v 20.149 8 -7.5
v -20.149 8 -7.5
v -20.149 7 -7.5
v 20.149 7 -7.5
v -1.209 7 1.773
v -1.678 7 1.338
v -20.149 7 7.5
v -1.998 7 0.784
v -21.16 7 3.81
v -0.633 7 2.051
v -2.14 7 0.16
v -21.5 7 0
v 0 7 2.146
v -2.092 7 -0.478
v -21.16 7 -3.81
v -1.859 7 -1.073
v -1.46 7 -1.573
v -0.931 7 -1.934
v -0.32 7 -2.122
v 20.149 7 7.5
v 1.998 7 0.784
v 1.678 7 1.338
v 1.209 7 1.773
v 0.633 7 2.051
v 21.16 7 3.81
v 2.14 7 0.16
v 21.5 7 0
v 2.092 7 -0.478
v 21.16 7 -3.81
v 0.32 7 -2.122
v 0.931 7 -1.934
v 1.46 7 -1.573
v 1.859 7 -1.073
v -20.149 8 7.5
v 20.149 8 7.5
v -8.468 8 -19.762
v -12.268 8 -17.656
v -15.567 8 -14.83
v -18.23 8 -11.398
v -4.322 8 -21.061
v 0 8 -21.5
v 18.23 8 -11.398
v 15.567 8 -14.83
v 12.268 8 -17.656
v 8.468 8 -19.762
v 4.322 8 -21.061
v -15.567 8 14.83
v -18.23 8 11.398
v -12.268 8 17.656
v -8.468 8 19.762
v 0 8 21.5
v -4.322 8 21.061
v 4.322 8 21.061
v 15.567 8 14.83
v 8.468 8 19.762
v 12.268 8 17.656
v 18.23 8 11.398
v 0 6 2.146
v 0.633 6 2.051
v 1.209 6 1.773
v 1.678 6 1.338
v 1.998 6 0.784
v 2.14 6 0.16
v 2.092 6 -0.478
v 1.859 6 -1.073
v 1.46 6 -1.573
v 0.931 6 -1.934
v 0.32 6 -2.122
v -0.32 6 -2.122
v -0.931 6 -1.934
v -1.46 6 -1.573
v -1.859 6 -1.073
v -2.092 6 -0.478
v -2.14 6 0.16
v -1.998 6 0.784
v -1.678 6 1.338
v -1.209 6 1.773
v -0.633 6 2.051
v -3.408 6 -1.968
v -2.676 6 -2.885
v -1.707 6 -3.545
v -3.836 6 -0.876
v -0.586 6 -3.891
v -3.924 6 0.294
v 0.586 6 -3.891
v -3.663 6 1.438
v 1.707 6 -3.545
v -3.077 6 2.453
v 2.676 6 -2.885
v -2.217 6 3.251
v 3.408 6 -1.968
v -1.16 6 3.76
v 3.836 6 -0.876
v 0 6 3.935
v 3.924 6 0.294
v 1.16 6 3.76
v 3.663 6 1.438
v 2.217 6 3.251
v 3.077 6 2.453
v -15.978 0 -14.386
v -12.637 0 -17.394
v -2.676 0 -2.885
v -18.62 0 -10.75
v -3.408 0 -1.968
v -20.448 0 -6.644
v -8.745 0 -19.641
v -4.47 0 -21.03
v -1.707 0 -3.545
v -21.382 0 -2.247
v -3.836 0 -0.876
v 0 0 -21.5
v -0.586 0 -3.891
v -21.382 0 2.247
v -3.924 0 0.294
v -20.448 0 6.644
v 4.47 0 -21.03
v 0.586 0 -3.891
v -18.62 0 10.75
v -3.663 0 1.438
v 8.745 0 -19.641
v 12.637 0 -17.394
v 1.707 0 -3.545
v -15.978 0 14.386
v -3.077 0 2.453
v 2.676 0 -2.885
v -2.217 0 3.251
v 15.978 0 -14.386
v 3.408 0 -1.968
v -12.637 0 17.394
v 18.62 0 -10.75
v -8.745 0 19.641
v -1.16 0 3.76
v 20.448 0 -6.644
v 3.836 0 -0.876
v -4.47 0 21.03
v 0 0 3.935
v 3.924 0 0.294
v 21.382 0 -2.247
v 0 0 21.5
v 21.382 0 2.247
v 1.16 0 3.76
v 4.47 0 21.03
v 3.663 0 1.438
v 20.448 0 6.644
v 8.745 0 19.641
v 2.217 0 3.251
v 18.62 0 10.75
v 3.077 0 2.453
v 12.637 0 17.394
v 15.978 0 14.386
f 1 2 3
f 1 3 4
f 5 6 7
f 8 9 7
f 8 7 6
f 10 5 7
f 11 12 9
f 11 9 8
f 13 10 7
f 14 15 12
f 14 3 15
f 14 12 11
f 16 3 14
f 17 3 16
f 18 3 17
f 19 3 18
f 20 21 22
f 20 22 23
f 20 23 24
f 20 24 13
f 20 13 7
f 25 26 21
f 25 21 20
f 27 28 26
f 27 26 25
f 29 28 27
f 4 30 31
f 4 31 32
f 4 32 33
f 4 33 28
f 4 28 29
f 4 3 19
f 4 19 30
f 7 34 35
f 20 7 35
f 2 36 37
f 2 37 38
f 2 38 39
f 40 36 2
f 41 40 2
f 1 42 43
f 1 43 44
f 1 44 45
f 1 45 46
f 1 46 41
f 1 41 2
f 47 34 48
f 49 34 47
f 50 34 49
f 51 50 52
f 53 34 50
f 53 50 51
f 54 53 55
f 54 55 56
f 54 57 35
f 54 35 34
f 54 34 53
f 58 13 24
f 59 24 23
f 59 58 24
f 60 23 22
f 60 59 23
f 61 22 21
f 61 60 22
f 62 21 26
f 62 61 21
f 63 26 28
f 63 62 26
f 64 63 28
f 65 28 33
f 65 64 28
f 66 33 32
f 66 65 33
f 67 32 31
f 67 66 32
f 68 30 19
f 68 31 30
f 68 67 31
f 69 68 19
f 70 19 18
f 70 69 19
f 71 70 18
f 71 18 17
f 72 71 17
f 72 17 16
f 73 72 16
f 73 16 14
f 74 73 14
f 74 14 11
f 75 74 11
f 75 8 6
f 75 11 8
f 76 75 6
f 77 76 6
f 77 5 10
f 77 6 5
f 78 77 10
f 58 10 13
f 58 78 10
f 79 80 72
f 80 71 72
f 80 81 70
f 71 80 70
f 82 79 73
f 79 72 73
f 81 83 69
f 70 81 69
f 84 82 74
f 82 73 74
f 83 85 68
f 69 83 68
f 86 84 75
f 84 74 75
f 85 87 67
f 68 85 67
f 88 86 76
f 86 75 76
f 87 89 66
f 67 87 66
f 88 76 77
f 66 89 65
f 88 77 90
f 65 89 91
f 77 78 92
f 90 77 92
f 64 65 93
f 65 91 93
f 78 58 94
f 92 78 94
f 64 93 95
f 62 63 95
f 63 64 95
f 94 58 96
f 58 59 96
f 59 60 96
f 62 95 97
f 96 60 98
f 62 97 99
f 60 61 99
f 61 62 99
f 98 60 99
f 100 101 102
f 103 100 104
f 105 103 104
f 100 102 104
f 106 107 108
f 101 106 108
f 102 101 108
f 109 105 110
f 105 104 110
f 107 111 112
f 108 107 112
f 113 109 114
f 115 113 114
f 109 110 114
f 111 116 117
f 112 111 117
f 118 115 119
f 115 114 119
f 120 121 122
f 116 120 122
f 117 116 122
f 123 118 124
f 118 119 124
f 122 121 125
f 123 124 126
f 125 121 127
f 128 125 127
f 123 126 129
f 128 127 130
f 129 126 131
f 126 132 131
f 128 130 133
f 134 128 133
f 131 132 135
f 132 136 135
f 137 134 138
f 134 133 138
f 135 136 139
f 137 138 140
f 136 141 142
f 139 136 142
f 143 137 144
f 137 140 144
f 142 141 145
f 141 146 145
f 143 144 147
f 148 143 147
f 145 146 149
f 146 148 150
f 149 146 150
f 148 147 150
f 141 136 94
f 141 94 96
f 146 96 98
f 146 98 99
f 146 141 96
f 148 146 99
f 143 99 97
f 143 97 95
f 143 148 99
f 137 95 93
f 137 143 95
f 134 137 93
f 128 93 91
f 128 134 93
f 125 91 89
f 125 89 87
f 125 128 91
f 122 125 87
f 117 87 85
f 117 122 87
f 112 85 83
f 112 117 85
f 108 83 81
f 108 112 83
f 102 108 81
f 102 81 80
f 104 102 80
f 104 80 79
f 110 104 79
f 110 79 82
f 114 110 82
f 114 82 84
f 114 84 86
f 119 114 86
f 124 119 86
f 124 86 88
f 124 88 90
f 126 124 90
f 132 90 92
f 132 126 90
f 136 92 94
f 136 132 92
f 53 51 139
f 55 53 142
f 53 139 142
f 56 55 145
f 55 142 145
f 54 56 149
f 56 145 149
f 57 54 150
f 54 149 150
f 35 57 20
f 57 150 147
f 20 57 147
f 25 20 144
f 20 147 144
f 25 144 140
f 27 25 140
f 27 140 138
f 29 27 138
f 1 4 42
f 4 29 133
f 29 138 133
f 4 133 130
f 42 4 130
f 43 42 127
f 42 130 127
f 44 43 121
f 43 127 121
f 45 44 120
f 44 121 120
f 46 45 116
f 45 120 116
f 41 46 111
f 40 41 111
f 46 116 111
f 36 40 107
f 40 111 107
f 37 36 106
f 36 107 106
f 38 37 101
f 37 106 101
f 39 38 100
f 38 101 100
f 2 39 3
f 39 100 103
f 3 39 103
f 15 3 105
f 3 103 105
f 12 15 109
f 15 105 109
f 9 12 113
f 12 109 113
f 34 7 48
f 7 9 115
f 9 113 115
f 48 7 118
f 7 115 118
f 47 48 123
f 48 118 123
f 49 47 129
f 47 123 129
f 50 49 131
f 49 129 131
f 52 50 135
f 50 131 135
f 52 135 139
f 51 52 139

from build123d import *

# Parameters (mm, degrees)
SKETCH1_R           = 21.5
SKETCH1_R_2         = 3.935
BOSS_EXTRUDE1_DEPTH = 6
SKETCH2_R           = 21.5
SKETCH2_R_2         = 2.146170777
BOSS_EXTRUDE2_DEPTH = 2
SKETCH3_W           = 47.979392496
SKETCH3_H           = 15
CUT_EXTRUDE1_DEPTH  = 1


with BuildPart() as part:
    # Sketch1 → Boss-Extrude1 (new body)
    with BuildSketch(Plane(origin=(0, 0, 0), x_dir=(1, 0, 0), z_dir=(0, 1, 0))):
        with Locations(Location((0, 0, 0), (0, 0, 270))):  # turned: the seam where the file's is
            Circle(SKETCH1_R)
        with Locations(Location((0, 0, 0), (0, 0, 270))):  # turned: the seam where the file's is
            Circle(SKETCH1_R_2, mode=Mode.SUBTRACT)
    extrude(amount=BOSS_EXTRUDE1_DEPTH)

    # Sketch2 → Boss-Extrude2 (add)
    with BuildSketch(Plane(origin=(0, 6, 0), x_dir=(1, 0, 0), z_dir=(0, 1, 0))):
        with Locations(Location((0, 0, 0), (0, 0, 270))):  # turned: the seam where the file's is
            Circle(SKETCH2_R)
        with Locations(Location((0, 0, 0), (0, 0, 270))):  # turned: the seam where the file's is
            Circle(SKETCH2_R_2, mode=Mode.SUBTRACT)
    extrude(amount=BOSS_EXTRUDE2_DEPTH)

    # Sketch3 → Cut-Extrude1 (cut)
    with BuildSketch(Plane(origin=(0, 8, 0), x_dir=(1, 0, 0), z_dir=(0, 1, 0))):
        Rectangle(SKETCH3_W, SKETCH3_H)
    extrude(amount=-CUT_EXTRUDE1_DEPTH, mode=Mode.SUBTRACT)


solid = part.part
